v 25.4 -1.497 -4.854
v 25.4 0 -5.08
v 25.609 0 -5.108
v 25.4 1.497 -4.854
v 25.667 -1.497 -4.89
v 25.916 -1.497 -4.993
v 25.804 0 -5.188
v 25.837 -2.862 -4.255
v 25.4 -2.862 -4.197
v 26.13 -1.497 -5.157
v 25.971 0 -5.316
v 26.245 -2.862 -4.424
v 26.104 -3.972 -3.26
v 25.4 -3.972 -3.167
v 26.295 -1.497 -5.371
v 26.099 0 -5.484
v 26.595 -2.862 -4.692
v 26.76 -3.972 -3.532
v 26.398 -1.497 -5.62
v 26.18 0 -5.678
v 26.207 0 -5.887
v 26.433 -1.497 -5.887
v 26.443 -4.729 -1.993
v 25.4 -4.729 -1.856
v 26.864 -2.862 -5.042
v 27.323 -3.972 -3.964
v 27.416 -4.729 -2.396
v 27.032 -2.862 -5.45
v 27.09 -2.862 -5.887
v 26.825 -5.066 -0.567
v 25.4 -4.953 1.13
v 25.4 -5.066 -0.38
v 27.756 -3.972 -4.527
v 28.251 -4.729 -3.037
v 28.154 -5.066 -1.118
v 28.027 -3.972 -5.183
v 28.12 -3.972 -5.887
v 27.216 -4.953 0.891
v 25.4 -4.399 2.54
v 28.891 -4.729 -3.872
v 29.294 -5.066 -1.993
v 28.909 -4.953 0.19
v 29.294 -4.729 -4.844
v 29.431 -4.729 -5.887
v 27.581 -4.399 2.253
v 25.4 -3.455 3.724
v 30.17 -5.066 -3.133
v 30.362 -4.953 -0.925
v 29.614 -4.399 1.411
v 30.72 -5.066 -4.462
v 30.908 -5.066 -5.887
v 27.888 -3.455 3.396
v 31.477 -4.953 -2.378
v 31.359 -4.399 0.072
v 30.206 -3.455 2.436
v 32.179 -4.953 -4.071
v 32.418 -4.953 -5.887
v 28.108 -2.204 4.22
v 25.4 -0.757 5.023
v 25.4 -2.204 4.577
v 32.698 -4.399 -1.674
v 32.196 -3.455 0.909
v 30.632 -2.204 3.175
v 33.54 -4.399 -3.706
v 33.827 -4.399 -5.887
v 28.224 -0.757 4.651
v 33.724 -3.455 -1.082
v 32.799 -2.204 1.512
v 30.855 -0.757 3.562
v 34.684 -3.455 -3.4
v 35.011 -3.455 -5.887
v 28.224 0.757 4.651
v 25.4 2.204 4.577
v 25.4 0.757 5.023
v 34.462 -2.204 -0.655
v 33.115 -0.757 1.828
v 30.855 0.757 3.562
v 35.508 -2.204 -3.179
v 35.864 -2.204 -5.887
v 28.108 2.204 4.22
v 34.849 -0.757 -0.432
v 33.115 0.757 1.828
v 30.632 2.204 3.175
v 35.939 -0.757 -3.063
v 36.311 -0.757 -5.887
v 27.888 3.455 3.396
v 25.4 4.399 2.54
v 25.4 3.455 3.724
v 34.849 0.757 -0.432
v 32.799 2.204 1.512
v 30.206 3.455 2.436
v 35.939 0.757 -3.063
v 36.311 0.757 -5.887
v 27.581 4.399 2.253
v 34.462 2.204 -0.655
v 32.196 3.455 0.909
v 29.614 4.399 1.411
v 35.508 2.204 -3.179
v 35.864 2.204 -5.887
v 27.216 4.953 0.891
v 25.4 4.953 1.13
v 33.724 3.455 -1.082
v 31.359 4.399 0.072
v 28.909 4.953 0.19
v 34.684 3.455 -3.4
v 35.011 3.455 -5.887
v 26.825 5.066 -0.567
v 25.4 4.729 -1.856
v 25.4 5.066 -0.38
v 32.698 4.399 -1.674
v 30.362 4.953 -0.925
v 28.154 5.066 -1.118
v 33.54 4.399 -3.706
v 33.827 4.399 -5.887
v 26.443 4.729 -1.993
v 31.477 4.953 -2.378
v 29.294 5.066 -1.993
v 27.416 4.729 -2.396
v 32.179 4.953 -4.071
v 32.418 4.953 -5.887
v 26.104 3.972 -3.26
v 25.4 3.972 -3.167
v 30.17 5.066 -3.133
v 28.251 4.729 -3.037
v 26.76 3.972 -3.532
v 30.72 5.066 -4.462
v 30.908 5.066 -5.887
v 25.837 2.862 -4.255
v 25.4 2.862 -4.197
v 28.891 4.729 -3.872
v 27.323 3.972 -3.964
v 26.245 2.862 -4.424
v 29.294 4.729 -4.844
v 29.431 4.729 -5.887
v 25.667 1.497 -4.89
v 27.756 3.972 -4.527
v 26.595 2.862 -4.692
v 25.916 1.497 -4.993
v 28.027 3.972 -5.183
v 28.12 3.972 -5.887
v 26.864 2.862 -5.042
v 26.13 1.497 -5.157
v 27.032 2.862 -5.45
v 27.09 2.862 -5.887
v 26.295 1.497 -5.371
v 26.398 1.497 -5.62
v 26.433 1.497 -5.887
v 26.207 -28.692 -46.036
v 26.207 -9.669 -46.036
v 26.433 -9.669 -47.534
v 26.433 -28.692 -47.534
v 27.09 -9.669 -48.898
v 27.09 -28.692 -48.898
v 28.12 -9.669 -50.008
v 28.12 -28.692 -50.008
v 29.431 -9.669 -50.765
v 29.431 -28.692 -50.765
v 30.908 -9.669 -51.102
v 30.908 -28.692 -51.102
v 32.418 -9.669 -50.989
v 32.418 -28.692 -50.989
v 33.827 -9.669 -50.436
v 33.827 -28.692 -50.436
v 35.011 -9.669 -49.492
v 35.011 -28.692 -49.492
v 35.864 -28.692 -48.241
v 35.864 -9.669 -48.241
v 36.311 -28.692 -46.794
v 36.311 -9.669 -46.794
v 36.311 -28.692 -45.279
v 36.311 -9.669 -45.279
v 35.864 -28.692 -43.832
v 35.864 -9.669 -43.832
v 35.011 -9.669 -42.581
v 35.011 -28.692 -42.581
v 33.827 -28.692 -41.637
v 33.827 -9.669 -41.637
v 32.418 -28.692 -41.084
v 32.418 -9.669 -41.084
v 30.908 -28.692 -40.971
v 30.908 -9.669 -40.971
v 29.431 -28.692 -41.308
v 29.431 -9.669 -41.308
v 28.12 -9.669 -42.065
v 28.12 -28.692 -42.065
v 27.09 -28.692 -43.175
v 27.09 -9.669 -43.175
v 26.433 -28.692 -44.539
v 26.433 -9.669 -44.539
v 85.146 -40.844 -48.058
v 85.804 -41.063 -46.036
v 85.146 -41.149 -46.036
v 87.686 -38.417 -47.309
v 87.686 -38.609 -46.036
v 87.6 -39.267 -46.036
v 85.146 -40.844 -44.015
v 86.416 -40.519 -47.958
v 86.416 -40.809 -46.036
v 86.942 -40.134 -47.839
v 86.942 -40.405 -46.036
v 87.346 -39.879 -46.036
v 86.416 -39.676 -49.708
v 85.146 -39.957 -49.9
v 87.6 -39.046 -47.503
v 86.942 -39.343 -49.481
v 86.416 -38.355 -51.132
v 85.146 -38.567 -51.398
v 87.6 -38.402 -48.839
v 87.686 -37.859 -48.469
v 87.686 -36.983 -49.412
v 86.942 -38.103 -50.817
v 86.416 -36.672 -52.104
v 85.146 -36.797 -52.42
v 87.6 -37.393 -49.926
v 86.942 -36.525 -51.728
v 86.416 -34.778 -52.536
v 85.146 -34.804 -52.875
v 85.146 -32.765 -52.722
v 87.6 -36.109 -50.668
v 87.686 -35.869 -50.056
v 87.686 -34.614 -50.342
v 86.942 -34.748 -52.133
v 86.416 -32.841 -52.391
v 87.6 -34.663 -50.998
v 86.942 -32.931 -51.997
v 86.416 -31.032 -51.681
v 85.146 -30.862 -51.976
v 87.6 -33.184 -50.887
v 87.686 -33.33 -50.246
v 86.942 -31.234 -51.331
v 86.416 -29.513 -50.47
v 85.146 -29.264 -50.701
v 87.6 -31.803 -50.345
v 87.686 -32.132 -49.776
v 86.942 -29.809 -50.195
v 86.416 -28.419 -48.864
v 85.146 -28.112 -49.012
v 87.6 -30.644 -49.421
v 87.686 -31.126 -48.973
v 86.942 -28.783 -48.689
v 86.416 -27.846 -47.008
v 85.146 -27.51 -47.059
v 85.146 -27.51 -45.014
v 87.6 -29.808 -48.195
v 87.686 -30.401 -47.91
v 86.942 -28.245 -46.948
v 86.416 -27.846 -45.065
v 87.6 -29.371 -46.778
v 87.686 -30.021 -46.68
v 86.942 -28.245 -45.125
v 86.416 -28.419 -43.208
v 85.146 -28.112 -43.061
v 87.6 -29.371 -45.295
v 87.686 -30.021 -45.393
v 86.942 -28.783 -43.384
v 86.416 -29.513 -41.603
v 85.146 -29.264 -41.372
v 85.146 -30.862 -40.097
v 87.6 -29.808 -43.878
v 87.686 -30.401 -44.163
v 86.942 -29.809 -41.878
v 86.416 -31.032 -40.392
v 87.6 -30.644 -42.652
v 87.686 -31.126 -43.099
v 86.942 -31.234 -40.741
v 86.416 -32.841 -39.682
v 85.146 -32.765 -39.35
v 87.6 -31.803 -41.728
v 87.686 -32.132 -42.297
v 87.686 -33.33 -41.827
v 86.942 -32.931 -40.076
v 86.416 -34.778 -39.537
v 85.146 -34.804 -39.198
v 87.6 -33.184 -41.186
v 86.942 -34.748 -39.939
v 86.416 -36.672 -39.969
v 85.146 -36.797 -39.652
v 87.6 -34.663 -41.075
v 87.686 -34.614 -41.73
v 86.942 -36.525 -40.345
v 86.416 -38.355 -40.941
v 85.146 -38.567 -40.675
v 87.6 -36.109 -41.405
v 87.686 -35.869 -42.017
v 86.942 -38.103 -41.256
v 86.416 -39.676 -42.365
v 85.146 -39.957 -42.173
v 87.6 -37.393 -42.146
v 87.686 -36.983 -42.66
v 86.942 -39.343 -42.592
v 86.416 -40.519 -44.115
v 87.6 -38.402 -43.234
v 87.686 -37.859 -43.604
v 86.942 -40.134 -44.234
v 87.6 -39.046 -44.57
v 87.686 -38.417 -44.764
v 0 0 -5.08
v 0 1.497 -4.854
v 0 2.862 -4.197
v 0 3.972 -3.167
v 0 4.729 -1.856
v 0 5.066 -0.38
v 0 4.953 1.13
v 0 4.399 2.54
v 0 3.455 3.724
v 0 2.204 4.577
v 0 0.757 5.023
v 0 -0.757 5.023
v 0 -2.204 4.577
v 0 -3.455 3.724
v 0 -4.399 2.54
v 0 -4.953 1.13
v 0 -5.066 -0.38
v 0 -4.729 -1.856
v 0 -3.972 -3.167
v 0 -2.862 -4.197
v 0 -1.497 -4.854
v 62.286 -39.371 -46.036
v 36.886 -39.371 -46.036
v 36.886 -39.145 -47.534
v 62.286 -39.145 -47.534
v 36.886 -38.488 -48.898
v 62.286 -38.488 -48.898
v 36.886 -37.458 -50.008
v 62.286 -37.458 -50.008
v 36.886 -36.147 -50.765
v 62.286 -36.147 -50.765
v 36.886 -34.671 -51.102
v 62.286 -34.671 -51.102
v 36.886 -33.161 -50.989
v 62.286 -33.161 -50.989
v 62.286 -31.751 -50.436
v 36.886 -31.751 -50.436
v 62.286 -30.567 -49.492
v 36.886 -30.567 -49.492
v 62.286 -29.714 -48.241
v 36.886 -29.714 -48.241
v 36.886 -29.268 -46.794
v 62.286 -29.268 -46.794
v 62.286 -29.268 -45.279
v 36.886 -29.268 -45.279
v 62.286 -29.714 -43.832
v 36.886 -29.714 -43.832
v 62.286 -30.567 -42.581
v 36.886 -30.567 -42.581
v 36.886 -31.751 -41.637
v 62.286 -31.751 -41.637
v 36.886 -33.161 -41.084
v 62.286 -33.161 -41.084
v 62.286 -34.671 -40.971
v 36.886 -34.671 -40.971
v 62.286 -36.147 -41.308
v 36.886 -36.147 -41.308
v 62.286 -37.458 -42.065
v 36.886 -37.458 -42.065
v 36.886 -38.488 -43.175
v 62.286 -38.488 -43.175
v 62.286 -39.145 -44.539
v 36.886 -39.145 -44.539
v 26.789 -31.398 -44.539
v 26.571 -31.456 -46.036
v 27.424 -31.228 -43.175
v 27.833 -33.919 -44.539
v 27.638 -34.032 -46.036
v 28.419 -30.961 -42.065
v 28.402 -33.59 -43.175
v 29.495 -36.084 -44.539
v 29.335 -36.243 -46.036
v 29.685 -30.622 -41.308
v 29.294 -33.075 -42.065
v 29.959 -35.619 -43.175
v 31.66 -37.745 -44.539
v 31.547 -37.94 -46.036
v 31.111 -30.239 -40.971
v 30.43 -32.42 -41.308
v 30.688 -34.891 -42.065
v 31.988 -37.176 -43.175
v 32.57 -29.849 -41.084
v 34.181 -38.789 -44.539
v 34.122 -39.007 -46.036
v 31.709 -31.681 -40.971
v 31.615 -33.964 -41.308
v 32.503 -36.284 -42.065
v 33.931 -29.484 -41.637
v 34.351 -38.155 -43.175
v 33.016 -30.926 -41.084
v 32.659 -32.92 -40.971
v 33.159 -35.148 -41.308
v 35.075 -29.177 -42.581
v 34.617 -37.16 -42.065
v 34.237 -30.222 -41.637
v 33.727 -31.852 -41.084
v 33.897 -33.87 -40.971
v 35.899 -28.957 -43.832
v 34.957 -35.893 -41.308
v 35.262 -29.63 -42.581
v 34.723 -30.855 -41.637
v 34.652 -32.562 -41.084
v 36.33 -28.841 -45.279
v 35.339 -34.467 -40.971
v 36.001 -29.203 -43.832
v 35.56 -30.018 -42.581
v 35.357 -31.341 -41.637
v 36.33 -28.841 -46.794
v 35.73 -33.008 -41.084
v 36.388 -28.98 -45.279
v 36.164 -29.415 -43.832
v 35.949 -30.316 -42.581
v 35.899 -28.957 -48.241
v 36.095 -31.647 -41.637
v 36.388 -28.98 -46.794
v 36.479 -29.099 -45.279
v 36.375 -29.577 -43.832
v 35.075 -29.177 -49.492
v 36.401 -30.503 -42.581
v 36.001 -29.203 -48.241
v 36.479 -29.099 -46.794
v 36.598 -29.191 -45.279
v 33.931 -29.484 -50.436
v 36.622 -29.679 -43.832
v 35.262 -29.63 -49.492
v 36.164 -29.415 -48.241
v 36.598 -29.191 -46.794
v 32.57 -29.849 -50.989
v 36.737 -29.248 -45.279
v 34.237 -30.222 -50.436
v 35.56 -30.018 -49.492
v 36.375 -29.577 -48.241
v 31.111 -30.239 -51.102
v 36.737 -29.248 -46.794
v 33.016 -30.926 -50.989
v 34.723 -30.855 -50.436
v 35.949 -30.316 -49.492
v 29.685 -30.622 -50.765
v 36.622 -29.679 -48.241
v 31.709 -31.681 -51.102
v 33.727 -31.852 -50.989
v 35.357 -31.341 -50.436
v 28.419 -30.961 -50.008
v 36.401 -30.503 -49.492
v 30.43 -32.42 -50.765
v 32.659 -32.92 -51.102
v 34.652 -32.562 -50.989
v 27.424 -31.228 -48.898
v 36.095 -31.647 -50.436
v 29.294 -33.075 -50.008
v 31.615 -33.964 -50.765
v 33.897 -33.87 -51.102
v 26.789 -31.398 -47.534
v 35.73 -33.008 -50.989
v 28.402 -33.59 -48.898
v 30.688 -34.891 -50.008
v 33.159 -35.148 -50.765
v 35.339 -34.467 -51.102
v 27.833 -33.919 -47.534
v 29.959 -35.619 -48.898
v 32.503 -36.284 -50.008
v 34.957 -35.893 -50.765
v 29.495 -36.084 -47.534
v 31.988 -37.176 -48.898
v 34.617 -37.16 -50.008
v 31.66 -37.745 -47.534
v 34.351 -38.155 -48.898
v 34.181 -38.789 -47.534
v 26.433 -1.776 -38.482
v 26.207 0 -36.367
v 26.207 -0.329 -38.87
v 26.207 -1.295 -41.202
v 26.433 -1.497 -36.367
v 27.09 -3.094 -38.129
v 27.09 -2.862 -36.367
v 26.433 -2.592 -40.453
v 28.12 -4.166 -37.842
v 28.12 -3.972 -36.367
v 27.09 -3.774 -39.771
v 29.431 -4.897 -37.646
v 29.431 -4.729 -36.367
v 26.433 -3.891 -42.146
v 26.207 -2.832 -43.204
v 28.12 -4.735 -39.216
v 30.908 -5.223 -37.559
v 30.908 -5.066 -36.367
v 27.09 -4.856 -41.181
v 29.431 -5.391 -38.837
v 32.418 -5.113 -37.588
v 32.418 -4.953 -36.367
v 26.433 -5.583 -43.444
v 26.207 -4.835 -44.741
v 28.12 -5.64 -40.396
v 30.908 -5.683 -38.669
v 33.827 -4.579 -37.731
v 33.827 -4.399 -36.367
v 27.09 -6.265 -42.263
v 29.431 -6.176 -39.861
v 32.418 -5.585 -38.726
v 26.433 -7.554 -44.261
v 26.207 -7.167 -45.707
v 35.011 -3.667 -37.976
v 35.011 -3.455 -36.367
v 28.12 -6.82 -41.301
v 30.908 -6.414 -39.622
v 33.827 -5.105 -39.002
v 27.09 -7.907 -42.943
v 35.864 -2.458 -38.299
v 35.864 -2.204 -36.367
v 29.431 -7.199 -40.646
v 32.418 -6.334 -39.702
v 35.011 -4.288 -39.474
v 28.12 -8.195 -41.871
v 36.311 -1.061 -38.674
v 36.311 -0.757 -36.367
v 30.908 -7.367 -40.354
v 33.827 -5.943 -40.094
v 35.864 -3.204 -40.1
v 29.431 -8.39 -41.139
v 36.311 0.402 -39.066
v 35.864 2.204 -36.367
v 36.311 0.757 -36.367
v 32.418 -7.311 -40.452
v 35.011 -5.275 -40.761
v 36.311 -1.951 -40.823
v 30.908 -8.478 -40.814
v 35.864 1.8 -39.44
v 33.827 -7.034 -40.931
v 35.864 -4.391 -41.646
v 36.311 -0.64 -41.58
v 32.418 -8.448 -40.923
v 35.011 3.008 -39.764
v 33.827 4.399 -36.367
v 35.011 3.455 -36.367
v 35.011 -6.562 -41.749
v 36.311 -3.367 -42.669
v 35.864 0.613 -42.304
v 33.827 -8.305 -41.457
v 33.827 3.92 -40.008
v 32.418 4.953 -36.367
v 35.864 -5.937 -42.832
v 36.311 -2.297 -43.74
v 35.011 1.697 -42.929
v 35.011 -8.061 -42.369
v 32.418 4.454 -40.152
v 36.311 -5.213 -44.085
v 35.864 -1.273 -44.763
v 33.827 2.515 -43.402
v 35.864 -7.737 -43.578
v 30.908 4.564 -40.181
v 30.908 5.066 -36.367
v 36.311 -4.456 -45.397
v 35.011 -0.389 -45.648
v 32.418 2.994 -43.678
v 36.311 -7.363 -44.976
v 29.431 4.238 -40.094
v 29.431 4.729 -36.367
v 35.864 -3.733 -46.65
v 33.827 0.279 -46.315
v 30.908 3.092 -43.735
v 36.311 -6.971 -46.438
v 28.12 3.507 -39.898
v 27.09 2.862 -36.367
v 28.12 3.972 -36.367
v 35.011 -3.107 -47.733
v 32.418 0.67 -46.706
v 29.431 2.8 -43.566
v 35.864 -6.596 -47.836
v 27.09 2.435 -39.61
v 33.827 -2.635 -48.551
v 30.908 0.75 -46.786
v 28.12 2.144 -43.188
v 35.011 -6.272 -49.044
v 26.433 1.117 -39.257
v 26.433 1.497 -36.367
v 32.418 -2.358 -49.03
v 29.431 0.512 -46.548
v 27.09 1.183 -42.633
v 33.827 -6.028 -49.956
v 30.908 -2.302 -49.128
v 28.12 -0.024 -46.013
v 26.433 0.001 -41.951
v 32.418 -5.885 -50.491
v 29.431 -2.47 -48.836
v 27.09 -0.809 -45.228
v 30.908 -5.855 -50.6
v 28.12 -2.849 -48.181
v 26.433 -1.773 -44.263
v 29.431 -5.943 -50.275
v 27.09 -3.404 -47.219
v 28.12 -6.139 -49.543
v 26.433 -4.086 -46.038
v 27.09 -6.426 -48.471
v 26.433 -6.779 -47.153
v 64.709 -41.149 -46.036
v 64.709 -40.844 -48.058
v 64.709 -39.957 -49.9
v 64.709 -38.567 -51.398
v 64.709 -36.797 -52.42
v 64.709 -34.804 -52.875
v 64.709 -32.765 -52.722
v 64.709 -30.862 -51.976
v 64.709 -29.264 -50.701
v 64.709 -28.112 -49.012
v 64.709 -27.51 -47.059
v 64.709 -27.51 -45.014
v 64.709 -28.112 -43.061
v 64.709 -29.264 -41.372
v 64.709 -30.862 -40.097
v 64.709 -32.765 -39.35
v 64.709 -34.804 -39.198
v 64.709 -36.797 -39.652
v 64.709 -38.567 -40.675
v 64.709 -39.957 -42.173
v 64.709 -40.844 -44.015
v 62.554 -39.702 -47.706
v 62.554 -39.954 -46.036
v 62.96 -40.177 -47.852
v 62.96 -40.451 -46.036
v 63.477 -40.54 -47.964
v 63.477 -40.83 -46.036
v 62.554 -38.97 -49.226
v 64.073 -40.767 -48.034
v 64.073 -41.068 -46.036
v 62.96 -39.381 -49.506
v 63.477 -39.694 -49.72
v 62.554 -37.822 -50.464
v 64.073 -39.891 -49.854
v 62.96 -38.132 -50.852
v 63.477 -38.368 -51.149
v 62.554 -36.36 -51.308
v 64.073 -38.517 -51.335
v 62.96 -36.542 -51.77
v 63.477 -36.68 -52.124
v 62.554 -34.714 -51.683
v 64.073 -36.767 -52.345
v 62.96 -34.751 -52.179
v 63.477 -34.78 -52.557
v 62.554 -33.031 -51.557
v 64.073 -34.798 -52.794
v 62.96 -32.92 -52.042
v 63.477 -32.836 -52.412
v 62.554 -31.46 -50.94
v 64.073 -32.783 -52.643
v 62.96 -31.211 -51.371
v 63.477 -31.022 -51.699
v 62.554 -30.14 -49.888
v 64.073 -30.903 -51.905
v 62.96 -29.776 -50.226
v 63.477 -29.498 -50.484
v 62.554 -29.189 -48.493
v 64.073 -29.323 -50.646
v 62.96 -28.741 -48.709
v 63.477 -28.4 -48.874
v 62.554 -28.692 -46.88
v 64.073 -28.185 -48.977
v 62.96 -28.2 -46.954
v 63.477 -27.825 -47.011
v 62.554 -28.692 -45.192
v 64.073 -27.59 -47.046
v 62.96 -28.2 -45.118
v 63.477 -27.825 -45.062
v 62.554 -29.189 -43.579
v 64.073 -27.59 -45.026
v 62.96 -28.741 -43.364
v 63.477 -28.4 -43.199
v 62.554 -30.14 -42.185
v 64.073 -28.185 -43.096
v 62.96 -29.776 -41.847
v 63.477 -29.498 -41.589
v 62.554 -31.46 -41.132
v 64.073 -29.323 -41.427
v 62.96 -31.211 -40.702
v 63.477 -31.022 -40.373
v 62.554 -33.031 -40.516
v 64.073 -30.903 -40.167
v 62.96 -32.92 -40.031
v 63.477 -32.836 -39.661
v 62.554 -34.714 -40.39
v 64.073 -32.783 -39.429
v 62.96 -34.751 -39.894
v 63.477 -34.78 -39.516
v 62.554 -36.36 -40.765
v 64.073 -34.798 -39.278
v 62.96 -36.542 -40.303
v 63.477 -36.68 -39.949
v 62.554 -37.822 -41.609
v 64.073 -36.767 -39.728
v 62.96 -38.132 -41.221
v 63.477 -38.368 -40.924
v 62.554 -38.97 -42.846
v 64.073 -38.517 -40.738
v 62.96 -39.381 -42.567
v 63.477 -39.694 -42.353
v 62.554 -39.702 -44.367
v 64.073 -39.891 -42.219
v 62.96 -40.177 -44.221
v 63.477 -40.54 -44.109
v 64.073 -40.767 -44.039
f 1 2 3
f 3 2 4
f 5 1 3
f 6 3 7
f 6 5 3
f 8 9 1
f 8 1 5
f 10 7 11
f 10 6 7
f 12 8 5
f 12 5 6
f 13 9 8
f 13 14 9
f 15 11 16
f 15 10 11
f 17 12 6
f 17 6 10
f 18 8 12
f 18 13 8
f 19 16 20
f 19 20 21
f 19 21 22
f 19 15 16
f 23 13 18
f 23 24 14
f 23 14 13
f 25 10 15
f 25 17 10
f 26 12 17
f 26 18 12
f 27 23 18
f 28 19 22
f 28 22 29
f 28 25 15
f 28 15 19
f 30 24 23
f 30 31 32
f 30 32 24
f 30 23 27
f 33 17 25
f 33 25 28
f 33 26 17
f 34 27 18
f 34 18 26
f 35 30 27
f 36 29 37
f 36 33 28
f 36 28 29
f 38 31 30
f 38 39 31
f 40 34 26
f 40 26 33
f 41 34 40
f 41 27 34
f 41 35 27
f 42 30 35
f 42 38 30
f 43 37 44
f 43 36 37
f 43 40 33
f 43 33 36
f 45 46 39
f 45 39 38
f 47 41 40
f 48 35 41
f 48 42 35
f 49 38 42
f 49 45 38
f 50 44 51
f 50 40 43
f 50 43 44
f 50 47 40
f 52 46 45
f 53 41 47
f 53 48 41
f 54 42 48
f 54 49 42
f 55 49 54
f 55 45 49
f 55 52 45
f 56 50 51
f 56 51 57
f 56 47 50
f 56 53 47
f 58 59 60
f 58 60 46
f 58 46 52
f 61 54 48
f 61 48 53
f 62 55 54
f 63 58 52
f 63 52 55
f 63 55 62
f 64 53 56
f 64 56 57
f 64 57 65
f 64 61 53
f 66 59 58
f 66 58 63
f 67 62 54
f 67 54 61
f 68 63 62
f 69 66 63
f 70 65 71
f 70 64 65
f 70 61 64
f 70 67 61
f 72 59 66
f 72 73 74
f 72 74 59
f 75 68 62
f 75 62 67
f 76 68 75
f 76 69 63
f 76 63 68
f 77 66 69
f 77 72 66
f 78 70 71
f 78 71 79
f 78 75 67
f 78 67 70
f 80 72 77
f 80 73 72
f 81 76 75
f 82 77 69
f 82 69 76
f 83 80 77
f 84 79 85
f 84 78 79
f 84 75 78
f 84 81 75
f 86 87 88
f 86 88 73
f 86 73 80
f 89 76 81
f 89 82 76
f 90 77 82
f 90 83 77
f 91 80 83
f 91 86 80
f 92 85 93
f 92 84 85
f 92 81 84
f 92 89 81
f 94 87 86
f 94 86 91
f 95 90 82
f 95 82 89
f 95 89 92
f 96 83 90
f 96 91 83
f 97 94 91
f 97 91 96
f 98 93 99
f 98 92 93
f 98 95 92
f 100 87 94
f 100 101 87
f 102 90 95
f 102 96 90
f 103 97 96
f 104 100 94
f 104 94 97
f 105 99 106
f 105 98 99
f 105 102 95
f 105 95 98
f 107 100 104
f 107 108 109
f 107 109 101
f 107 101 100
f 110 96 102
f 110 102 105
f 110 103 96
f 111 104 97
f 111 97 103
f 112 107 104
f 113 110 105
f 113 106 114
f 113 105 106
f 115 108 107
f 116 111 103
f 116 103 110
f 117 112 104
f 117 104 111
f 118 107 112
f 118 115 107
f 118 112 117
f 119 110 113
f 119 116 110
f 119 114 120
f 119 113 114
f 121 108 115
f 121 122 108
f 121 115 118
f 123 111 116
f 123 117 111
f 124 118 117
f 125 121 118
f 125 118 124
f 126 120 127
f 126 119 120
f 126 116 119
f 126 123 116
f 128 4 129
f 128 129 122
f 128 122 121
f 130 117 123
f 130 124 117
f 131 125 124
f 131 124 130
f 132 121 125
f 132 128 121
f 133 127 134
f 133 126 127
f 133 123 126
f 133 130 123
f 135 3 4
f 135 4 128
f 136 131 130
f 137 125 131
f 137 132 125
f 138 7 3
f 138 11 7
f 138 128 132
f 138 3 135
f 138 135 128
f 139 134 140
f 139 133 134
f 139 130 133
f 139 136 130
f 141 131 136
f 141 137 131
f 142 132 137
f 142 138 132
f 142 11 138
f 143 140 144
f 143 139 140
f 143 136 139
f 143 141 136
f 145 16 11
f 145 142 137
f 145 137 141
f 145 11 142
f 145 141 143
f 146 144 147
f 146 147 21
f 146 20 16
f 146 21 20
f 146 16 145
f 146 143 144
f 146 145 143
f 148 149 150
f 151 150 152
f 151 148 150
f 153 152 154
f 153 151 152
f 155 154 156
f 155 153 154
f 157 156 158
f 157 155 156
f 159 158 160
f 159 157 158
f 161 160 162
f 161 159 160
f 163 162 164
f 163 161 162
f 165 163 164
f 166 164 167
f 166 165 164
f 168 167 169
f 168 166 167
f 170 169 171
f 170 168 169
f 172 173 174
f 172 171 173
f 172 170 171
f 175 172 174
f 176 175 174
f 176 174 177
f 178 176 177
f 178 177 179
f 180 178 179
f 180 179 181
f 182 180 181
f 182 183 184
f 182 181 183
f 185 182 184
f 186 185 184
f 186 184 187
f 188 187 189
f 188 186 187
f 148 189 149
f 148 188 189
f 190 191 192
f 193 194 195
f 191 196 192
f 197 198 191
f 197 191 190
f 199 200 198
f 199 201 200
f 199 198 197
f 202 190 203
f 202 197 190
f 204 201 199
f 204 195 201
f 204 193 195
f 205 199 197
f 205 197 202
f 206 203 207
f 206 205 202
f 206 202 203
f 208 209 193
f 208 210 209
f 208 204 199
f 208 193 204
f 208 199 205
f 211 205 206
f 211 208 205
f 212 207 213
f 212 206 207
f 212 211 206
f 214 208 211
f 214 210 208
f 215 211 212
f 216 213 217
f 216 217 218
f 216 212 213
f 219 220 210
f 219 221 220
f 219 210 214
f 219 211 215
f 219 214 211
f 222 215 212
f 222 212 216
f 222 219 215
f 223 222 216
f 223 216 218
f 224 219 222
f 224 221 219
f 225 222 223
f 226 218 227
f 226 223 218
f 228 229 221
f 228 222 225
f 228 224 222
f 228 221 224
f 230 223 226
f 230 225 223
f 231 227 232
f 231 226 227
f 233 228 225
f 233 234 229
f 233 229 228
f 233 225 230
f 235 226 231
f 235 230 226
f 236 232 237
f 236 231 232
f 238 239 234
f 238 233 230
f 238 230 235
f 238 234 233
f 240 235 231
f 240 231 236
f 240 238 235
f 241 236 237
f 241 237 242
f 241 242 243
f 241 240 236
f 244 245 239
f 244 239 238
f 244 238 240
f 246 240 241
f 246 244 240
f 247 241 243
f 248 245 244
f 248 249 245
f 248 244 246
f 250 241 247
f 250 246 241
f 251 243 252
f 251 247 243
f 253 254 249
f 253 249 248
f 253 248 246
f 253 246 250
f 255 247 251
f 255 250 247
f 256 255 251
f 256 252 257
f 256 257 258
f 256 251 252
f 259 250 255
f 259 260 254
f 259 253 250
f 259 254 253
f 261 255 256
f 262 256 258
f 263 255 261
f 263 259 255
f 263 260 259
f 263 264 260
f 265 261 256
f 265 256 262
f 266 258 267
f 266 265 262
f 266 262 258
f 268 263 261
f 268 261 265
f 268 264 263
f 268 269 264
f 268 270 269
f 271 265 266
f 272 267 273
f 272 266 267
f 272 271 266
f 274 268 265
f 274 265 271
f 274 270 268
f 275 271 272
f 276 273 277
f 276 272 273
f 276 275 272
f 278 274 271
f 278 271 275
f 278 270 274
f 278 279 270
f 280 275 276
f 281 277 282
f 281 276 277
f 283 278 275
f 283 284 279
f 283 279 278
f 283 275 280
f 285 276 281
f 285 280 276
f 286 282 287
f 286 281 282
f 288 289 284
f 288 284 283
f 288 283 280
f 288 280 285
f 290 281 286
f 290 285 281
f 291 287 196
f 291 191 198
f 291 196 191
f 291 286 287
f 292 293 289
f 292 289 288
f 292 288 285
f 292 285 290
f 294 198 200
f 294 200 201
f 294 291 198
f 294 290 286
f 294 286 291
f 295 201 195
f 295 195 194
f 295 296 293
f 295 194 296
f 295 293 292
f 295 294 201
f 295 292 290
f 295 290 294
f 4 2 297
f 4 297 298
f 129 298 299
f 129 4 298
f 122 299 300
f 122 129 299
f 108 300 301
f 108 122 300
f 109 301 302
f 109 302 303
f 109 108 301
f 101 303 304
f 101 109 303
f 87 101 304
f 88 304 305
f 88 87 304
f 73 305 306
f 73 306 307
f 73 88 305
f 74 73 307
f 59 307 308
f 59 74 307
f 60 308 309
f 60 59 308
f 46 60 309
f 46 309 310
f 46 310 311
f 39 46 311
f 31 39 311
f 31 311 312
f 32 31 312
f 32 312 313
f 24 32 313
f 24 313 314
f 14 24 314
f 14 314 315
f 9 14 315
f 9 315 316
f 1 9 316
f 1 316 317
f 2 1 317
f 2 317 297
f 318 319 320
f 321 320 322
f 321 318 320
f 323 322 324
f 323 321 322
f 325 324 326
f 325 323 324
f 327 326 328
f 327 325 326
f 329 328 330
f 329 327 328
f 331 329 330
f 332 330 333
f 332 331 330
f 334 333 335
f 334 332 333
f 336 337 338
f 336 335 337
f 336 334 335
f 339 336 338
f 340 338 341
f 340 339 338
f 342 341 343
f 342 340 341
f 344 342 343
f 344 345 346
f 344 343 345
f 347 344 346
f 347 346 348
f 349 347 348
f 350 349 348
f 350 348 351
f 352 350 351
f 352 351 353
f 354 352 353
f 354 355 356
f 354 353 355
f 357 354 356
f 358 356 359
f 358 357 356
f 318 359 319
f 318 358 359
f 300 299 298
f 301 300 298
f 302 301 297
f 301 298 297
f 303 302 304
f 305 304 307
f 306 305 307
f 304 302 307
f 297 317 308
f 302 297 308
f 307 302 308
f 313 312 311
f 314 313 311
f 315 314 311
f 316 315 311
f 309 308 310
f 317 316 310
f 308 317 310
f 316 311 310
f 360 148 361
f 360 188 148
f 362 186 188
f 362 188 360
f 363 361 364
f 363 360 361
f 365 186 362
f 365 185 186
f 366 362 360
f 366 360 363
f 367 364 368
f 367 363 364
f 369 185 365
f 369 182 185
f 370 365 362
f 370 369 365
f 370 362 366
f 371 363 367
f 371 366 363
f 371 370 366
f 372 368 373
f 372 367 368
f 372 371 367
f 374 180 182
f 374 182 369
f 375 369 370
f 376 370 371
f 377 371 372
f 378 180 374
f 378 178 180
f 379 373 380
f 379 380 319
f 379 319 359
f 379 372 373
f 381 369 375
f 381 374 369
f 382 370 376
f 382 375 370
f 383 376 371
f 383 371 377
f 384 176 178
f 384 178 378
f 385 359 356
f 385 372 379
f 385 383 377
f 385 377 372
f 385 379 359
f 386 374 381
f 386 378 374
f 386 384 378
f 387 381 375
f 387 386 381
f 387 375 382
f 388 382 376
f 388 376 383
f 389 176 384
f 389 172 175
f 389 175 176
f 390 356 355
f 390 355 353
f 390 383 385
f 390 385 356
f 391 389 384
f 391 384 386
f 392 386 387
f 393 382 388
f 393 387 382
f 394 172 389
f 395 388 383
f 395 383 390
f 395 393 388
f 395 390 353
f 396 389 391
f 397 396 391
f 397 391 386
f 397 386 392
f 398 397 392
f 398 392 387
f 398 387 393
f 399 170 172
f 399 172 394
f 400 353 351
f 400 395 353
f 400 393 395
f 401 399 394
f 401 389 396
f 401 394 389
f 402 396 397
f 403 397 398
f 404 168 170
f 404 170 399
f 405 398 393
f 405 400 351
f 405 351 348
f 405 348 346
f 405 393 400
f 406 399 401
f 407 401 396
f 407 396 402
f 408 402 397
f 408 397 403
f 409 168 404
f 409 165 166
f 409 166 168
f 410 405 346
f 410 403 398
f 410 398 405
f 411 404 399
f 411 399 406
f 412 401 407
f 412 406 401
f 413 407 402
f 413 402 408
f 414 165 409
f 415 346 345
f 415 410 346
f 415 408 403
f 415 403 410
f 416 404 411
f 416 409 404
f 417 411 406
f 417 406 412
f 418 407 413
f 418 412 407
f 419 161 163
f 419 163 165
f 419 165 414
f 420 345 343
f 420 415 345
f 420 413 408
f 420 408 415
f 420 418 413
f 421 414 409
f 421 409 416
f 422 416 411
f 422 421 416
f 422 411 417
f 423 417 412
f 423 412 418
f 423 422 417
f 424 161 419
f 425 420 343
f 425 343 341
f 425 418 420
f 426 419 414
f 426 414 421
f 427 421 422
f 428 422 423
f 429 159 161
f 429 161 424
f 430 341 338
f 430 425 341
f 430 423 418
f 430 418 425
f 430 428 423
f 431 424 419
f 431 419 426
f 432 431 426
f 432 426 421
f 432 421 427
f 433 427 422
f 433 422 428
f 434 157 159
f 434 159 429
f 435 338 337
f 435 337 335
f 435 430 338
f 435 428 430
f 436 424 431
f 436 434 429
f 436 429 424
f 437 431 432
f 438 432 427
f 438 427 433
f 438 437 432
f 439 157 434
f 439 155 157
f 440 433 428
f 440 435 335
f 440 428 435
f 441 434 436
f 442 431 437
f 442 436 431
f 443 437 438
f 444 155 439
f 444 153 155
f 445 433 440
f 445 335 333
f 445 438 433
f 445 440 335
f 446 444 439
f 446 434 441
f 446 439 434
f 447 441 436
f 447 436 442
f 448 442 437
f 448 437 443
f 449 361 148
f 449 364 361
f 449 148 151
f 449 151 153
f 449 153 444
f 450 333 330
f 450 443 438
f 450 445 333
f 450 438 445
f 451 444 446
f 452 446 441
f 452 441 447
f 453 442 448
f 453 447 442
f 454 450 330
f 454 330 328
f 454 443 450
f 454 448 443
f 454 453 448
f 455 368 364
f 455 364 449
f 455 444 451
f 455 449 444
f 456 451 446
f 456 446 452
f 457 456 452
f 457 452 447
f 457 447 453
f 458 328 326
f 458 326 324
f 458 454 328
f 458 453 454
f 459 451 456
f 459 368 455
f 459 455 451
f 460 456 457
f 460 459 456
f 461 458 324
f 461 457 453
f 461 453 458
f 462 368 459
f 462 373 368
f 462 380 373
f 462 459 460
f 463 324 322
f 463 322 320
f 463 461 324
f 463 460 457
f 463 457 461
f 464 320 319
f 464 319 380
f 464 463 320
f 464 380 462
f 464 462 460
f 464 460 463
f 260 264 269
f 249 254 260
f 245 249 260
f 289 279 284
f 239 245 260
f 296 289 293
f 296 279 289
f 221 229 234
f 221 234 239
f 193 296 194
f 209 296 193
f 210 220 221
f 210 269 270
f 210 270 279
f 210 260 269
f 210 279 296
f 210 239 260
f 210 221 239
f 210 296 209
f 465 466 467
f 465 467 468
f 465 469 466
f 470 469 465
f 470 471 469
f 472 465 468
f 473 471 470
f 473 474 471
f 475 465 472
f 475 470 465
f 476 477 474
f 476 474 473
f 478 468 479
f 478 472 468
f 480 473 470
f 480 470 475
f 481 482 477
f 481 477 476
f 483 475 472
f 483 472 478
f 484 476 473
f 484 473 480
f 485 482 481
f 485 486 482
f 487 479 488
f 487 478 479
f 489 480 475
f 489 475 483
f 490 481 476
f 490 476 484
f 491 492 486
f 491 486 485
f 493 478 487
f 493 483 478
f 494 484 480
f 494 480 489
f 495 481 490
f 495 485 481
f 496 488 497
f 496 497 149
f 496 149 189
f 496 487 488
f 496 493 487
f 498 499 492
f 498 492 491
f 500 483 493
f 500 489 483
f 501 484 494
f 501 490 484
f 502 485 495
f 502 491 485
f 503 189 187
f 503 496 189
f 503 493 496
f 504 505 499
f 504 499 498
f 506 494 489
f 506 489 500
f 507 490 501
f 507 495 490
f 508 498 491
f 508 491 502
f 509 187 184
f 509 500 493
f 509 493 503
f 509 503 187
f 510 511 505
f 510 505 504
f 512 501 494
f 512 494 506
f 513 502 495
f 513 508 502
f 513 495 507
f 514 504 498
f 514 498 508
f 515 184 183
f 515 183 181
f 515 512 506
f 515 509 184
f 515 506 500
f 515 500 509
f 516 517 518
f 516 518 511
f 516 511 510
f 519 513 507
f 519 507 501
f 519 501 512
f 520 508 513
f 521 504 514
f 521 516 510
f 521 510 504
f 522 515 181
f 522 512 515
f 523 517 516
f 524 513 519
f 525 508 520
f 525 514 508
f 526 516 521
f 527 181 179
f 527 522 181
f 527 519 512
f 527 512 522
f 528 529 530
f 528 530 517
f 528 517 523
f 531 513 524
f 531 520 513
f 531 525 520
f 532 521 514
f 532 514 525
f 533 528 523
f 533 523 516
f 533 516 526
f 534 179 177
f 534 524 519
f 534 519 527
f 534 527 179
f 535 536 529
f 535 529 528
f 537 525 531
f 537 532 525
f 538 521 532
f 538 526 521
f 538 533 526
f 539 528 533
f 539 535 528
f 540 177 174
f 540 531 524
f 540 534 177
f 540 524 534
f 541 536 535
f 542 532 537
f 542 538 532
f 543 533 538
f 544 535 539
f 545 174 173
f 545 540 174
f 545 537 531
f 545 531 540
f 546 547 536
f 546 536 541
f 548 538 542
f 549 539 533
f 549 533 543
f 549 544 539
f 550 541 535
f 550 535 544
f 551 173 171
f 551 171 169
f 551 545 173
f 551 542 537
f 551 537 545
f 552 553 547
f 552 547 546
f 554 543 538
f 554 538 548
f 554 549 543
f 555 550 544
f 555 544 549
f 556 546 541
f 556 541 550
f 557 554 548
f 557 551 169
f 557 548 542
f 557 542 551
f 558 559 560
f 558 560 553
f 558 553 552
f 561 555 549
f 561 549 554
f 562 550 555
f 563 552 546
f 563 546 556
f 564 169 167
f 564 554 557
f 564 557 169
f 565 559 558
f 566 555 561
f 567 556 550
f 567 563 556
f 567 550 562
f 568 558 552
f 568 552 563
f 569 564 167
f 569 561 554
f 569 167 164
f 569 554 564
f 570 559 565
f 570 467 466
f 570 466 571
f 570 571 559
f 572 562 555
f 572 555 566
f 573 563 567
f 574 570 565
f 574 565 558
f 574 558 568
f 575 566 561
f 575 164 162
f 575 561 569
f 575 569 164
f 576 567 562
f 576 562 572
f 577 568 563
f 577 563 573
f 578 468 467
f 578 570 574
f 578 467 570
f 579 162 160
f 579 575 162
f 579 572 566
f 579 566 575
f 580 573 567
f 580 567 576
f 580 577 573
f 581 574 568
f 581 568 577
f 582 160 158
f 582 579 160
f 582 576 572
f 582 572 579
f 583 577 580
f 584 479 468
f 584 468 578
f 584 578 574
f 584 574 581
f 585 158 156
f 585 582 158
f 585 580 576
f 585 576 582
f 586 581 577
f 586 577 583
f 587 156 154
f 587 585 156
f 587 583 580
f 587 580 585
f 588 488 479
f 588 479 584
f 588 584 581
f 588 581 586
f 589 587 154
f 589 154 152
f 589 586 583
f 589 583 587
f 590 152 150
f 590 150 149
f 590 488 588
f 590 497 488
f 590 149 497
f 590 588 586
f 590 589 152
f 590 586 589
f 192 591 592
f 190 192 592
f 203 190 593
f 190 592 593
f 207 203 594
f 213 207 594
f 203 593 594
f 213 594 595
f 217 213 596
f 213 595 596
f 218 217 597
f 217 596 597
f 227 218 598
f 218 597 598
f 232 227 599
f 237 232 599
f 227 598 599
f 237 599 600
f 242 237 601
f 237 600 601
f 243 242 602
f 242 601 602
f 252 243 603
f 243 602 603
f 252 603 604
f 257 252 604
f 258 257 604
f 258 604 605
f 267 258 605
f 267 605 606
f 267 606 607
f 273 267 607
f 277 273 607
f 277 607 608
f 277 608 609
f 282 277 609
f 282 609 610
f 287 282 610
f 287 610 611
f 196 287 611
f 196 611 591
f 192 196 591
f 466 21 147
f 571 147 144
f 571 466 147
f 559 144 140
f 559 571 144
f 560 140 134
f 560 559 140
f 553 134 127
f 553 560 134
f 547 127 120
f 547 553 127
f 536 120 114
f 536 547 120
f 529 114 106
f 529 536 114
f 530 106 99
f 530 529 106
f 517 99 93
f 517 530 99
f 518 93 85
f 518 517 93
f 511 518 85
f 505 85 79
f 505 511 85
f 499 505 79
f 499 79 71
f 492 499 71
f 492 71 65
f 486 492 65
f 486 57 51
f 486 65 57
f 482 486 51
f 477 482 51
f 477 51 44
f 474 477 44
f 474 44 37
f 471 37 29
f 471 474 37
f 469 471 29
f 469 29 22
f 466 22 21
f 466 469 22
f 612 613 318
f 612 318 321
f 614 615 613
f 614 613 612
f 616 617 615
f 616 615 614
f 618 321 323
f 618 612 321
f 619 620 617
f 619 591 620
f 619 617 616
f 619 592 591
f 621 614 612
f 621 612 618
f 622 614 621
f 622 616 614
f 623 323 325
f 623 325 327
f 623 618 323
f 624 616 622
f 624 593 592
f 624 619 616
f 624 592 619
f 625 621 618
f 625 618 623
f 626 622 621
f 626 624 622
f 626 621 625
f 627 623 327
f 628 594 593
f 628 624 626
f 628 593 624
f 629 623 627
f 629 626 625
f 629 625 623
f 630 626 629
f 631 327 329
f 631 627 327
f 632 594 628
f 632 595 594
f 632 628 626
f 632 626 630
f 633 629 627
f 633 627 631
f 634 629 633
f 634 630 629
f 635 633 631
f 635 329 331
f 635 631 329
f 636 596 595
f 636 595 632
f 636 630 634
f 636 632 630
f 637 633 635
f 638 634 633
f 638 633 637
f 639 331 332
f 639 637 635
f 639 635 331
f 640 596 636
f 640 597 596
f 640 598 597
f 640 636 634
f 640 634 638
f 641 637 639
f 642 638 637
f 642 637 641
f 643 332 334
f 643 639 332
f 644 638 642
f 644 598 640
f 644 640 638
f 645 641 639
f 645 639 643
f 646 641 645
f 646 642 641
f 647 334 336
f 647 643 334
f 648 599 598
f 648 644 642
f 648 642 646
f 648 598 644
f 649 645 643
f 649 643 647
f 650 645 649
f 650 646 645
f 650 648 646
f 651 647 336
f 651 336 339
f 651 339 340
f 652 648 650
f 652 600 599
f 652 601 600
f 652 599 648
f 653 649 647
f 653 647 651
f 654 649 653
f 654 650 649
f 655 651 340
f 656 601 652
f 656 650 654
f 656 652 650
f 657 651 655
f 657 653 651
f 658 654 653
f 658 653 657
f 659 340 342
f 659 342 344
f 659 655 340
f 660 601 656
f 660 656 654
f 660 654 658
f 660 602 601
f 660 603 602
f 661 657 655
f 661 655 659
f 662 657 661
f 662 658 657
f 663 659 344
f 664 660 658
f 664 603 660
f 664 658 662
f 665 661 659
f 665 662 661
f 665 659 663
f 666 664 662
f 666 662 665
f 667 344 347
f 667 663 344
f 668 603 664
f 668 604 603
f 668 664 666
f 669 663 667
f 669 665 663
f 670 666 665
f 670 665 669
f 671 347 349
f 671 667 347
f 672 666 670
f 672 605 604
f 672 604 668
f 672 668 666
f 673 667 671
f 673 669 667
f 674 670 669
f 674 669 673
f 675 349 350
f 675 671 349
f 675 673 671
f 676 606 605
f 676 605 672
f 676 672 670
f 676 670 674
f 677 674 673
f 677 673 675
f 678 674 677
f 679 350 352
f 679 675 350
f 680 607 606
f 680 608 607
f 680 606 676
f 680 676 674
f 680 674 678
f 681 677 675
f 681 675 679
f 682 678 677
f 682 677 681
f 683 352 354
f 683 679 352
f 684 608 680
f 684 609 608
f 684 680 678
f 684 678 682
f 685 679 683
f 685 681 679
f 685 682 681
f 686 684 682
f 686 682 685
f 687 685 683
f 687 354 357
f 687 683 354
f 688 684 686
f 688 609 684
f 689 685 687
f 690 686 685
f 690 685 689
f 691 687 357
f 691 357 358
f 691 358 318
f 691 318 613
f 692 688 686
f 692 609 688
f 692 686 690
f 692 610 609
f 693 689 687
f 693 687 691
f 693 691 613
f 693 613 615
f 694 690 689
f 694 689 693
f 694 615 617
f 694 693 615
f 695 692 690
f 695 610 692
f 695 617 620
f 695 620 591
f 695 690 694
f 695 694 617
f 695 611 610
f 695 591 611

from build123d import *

# Parameters (mm, degrees)
SKETCH6_R           = 5.08
SKETCH7_R           = 6.858
BOSS_EXTRUDE1_DEPTH = 25.4
FILLET1_R           = 2.54


with BuildPart() as part:
    # Sweep1: sweep along a curve in space
    with BuildLine() as sweep1_path:
        Line((0, 0, 0), (25.4, 0, 0))
        ThreePointArc((25.4, 0, 0), (29.562920183, 0, -1.724337999), (31.287258182, 0, -5.887258182))
        Line((31.287258182, 0, -5.887258182), (31.287258182, 0, -36.367258182))
        ThreePointArc((31.287258182, 0, -36.367258182), (31.287258182, -2.832027095, -43.204376403), (31.287258182, -9.669145315, -46.036403497))
        Line((31.287258182, -9.669145315, -46.036403497), (31.287258182, -28.692102311, -46.036403497))
        ThreePointArc((31.287258182, -28.692102311, -46.036403497), (32.927182179, -32.651229067, -46.036403497), (36.886308936, -34.291153065, -46.036403497))
        Line((36.886308936, -34.291153065, -46.036403497), (62.286308936, -34.291153065, -46.036403497))
    # Sketch6 → Sweep1 (sweep)
    with BuildSketch(Plane(origin=(0, 0, 0), x_dir=(0, 0, -1), z_dir=(1, 0, 0))):
        Circle(SKETCH6_R)
    sweep(path=sweep1_path.line)

    # Sketch7 → Boss-Extrude1 (add)
    with BuildSketch(Plane(origin=(62.286308936, 0, 0), x_dir=(0, 0, -1), z_dir=(1, 0, 0))):
        with Locations(Location((46.036403497, -34.291153065, 0), (0, 0, 270))):
            Circle(SKETCH7_R)
    extrude(amount=BOSS_EXTRUDE1_DEPTH)

    # Fillet1
    # the kernel refuses this fillet: 2.54 mm, written as the material it takes off along each edge
    with BuildSketch(Plane(origin=(62.286308936, -34.291153065, -46.036403497), x_dir=(0, -1, 0), z_dir=(0, 0, 1))) as fillet1_piece_1:
        with BuildLine():
            CenterArc((4.318, 2.423005572), FILLET1_R, 287.457603124, 72.542396876)
            Line((5.08, 0), (5.09524, -0.048460111))
            ThreePointArc((5.09524, -0.048460111), (5.969, -0.0508), (6.858, -0.0508))
            Line((6.858, -0.0508), (6.9088, 0))
            Line((6.9088, 0), (6.9088, 2.423005572))
            Line((6.9088, 2.423005572), (6.858, 2.423005572))
        make_face()
    revolve(axis=Axis((62.286308936, -34.291153065, -46.036403497), (1, 0, 0)), mode=Mode.SUBTRACT)
    with BuildSketch(Plane(origin=(87.686308936, -34.291153065, -46.036403497), x_dir=(0, -1, 0), z_dir=(0, 0, 1))) as fillet1_piece_2:
        with BuildLine():
            CenterArc((6.858 - FILLET1_R, -FILLET1_R), FILLET1_R, 0, 90)
            Line((6.858 - FILLET1_R, 0), (6.858 - FILLET1_R, FILLET1_R * 0.02))
            Line((6.858 - FILLET1_R, FILLET1_R * 0.02), (6.858 + FILLET1_R * 0.02, FILLET1_R * 0.02))
            Line((6.858 + FILLET1_R * 0.02, FILLET1_R * 0.02), (6.858 + FILLET1_R * 0.02, -FILLET1_R))
            Line((6.858 + FILLET1_R * 0.02, -FILLET1_R), (6.858, -FILLET1_R))
        make_face()
    revolve(axis=Axis((87.686308936, -34.291153065, -46.036403497), (1, 0, 0)), mode=Mode.SUBTRACT)


solid = part.part
